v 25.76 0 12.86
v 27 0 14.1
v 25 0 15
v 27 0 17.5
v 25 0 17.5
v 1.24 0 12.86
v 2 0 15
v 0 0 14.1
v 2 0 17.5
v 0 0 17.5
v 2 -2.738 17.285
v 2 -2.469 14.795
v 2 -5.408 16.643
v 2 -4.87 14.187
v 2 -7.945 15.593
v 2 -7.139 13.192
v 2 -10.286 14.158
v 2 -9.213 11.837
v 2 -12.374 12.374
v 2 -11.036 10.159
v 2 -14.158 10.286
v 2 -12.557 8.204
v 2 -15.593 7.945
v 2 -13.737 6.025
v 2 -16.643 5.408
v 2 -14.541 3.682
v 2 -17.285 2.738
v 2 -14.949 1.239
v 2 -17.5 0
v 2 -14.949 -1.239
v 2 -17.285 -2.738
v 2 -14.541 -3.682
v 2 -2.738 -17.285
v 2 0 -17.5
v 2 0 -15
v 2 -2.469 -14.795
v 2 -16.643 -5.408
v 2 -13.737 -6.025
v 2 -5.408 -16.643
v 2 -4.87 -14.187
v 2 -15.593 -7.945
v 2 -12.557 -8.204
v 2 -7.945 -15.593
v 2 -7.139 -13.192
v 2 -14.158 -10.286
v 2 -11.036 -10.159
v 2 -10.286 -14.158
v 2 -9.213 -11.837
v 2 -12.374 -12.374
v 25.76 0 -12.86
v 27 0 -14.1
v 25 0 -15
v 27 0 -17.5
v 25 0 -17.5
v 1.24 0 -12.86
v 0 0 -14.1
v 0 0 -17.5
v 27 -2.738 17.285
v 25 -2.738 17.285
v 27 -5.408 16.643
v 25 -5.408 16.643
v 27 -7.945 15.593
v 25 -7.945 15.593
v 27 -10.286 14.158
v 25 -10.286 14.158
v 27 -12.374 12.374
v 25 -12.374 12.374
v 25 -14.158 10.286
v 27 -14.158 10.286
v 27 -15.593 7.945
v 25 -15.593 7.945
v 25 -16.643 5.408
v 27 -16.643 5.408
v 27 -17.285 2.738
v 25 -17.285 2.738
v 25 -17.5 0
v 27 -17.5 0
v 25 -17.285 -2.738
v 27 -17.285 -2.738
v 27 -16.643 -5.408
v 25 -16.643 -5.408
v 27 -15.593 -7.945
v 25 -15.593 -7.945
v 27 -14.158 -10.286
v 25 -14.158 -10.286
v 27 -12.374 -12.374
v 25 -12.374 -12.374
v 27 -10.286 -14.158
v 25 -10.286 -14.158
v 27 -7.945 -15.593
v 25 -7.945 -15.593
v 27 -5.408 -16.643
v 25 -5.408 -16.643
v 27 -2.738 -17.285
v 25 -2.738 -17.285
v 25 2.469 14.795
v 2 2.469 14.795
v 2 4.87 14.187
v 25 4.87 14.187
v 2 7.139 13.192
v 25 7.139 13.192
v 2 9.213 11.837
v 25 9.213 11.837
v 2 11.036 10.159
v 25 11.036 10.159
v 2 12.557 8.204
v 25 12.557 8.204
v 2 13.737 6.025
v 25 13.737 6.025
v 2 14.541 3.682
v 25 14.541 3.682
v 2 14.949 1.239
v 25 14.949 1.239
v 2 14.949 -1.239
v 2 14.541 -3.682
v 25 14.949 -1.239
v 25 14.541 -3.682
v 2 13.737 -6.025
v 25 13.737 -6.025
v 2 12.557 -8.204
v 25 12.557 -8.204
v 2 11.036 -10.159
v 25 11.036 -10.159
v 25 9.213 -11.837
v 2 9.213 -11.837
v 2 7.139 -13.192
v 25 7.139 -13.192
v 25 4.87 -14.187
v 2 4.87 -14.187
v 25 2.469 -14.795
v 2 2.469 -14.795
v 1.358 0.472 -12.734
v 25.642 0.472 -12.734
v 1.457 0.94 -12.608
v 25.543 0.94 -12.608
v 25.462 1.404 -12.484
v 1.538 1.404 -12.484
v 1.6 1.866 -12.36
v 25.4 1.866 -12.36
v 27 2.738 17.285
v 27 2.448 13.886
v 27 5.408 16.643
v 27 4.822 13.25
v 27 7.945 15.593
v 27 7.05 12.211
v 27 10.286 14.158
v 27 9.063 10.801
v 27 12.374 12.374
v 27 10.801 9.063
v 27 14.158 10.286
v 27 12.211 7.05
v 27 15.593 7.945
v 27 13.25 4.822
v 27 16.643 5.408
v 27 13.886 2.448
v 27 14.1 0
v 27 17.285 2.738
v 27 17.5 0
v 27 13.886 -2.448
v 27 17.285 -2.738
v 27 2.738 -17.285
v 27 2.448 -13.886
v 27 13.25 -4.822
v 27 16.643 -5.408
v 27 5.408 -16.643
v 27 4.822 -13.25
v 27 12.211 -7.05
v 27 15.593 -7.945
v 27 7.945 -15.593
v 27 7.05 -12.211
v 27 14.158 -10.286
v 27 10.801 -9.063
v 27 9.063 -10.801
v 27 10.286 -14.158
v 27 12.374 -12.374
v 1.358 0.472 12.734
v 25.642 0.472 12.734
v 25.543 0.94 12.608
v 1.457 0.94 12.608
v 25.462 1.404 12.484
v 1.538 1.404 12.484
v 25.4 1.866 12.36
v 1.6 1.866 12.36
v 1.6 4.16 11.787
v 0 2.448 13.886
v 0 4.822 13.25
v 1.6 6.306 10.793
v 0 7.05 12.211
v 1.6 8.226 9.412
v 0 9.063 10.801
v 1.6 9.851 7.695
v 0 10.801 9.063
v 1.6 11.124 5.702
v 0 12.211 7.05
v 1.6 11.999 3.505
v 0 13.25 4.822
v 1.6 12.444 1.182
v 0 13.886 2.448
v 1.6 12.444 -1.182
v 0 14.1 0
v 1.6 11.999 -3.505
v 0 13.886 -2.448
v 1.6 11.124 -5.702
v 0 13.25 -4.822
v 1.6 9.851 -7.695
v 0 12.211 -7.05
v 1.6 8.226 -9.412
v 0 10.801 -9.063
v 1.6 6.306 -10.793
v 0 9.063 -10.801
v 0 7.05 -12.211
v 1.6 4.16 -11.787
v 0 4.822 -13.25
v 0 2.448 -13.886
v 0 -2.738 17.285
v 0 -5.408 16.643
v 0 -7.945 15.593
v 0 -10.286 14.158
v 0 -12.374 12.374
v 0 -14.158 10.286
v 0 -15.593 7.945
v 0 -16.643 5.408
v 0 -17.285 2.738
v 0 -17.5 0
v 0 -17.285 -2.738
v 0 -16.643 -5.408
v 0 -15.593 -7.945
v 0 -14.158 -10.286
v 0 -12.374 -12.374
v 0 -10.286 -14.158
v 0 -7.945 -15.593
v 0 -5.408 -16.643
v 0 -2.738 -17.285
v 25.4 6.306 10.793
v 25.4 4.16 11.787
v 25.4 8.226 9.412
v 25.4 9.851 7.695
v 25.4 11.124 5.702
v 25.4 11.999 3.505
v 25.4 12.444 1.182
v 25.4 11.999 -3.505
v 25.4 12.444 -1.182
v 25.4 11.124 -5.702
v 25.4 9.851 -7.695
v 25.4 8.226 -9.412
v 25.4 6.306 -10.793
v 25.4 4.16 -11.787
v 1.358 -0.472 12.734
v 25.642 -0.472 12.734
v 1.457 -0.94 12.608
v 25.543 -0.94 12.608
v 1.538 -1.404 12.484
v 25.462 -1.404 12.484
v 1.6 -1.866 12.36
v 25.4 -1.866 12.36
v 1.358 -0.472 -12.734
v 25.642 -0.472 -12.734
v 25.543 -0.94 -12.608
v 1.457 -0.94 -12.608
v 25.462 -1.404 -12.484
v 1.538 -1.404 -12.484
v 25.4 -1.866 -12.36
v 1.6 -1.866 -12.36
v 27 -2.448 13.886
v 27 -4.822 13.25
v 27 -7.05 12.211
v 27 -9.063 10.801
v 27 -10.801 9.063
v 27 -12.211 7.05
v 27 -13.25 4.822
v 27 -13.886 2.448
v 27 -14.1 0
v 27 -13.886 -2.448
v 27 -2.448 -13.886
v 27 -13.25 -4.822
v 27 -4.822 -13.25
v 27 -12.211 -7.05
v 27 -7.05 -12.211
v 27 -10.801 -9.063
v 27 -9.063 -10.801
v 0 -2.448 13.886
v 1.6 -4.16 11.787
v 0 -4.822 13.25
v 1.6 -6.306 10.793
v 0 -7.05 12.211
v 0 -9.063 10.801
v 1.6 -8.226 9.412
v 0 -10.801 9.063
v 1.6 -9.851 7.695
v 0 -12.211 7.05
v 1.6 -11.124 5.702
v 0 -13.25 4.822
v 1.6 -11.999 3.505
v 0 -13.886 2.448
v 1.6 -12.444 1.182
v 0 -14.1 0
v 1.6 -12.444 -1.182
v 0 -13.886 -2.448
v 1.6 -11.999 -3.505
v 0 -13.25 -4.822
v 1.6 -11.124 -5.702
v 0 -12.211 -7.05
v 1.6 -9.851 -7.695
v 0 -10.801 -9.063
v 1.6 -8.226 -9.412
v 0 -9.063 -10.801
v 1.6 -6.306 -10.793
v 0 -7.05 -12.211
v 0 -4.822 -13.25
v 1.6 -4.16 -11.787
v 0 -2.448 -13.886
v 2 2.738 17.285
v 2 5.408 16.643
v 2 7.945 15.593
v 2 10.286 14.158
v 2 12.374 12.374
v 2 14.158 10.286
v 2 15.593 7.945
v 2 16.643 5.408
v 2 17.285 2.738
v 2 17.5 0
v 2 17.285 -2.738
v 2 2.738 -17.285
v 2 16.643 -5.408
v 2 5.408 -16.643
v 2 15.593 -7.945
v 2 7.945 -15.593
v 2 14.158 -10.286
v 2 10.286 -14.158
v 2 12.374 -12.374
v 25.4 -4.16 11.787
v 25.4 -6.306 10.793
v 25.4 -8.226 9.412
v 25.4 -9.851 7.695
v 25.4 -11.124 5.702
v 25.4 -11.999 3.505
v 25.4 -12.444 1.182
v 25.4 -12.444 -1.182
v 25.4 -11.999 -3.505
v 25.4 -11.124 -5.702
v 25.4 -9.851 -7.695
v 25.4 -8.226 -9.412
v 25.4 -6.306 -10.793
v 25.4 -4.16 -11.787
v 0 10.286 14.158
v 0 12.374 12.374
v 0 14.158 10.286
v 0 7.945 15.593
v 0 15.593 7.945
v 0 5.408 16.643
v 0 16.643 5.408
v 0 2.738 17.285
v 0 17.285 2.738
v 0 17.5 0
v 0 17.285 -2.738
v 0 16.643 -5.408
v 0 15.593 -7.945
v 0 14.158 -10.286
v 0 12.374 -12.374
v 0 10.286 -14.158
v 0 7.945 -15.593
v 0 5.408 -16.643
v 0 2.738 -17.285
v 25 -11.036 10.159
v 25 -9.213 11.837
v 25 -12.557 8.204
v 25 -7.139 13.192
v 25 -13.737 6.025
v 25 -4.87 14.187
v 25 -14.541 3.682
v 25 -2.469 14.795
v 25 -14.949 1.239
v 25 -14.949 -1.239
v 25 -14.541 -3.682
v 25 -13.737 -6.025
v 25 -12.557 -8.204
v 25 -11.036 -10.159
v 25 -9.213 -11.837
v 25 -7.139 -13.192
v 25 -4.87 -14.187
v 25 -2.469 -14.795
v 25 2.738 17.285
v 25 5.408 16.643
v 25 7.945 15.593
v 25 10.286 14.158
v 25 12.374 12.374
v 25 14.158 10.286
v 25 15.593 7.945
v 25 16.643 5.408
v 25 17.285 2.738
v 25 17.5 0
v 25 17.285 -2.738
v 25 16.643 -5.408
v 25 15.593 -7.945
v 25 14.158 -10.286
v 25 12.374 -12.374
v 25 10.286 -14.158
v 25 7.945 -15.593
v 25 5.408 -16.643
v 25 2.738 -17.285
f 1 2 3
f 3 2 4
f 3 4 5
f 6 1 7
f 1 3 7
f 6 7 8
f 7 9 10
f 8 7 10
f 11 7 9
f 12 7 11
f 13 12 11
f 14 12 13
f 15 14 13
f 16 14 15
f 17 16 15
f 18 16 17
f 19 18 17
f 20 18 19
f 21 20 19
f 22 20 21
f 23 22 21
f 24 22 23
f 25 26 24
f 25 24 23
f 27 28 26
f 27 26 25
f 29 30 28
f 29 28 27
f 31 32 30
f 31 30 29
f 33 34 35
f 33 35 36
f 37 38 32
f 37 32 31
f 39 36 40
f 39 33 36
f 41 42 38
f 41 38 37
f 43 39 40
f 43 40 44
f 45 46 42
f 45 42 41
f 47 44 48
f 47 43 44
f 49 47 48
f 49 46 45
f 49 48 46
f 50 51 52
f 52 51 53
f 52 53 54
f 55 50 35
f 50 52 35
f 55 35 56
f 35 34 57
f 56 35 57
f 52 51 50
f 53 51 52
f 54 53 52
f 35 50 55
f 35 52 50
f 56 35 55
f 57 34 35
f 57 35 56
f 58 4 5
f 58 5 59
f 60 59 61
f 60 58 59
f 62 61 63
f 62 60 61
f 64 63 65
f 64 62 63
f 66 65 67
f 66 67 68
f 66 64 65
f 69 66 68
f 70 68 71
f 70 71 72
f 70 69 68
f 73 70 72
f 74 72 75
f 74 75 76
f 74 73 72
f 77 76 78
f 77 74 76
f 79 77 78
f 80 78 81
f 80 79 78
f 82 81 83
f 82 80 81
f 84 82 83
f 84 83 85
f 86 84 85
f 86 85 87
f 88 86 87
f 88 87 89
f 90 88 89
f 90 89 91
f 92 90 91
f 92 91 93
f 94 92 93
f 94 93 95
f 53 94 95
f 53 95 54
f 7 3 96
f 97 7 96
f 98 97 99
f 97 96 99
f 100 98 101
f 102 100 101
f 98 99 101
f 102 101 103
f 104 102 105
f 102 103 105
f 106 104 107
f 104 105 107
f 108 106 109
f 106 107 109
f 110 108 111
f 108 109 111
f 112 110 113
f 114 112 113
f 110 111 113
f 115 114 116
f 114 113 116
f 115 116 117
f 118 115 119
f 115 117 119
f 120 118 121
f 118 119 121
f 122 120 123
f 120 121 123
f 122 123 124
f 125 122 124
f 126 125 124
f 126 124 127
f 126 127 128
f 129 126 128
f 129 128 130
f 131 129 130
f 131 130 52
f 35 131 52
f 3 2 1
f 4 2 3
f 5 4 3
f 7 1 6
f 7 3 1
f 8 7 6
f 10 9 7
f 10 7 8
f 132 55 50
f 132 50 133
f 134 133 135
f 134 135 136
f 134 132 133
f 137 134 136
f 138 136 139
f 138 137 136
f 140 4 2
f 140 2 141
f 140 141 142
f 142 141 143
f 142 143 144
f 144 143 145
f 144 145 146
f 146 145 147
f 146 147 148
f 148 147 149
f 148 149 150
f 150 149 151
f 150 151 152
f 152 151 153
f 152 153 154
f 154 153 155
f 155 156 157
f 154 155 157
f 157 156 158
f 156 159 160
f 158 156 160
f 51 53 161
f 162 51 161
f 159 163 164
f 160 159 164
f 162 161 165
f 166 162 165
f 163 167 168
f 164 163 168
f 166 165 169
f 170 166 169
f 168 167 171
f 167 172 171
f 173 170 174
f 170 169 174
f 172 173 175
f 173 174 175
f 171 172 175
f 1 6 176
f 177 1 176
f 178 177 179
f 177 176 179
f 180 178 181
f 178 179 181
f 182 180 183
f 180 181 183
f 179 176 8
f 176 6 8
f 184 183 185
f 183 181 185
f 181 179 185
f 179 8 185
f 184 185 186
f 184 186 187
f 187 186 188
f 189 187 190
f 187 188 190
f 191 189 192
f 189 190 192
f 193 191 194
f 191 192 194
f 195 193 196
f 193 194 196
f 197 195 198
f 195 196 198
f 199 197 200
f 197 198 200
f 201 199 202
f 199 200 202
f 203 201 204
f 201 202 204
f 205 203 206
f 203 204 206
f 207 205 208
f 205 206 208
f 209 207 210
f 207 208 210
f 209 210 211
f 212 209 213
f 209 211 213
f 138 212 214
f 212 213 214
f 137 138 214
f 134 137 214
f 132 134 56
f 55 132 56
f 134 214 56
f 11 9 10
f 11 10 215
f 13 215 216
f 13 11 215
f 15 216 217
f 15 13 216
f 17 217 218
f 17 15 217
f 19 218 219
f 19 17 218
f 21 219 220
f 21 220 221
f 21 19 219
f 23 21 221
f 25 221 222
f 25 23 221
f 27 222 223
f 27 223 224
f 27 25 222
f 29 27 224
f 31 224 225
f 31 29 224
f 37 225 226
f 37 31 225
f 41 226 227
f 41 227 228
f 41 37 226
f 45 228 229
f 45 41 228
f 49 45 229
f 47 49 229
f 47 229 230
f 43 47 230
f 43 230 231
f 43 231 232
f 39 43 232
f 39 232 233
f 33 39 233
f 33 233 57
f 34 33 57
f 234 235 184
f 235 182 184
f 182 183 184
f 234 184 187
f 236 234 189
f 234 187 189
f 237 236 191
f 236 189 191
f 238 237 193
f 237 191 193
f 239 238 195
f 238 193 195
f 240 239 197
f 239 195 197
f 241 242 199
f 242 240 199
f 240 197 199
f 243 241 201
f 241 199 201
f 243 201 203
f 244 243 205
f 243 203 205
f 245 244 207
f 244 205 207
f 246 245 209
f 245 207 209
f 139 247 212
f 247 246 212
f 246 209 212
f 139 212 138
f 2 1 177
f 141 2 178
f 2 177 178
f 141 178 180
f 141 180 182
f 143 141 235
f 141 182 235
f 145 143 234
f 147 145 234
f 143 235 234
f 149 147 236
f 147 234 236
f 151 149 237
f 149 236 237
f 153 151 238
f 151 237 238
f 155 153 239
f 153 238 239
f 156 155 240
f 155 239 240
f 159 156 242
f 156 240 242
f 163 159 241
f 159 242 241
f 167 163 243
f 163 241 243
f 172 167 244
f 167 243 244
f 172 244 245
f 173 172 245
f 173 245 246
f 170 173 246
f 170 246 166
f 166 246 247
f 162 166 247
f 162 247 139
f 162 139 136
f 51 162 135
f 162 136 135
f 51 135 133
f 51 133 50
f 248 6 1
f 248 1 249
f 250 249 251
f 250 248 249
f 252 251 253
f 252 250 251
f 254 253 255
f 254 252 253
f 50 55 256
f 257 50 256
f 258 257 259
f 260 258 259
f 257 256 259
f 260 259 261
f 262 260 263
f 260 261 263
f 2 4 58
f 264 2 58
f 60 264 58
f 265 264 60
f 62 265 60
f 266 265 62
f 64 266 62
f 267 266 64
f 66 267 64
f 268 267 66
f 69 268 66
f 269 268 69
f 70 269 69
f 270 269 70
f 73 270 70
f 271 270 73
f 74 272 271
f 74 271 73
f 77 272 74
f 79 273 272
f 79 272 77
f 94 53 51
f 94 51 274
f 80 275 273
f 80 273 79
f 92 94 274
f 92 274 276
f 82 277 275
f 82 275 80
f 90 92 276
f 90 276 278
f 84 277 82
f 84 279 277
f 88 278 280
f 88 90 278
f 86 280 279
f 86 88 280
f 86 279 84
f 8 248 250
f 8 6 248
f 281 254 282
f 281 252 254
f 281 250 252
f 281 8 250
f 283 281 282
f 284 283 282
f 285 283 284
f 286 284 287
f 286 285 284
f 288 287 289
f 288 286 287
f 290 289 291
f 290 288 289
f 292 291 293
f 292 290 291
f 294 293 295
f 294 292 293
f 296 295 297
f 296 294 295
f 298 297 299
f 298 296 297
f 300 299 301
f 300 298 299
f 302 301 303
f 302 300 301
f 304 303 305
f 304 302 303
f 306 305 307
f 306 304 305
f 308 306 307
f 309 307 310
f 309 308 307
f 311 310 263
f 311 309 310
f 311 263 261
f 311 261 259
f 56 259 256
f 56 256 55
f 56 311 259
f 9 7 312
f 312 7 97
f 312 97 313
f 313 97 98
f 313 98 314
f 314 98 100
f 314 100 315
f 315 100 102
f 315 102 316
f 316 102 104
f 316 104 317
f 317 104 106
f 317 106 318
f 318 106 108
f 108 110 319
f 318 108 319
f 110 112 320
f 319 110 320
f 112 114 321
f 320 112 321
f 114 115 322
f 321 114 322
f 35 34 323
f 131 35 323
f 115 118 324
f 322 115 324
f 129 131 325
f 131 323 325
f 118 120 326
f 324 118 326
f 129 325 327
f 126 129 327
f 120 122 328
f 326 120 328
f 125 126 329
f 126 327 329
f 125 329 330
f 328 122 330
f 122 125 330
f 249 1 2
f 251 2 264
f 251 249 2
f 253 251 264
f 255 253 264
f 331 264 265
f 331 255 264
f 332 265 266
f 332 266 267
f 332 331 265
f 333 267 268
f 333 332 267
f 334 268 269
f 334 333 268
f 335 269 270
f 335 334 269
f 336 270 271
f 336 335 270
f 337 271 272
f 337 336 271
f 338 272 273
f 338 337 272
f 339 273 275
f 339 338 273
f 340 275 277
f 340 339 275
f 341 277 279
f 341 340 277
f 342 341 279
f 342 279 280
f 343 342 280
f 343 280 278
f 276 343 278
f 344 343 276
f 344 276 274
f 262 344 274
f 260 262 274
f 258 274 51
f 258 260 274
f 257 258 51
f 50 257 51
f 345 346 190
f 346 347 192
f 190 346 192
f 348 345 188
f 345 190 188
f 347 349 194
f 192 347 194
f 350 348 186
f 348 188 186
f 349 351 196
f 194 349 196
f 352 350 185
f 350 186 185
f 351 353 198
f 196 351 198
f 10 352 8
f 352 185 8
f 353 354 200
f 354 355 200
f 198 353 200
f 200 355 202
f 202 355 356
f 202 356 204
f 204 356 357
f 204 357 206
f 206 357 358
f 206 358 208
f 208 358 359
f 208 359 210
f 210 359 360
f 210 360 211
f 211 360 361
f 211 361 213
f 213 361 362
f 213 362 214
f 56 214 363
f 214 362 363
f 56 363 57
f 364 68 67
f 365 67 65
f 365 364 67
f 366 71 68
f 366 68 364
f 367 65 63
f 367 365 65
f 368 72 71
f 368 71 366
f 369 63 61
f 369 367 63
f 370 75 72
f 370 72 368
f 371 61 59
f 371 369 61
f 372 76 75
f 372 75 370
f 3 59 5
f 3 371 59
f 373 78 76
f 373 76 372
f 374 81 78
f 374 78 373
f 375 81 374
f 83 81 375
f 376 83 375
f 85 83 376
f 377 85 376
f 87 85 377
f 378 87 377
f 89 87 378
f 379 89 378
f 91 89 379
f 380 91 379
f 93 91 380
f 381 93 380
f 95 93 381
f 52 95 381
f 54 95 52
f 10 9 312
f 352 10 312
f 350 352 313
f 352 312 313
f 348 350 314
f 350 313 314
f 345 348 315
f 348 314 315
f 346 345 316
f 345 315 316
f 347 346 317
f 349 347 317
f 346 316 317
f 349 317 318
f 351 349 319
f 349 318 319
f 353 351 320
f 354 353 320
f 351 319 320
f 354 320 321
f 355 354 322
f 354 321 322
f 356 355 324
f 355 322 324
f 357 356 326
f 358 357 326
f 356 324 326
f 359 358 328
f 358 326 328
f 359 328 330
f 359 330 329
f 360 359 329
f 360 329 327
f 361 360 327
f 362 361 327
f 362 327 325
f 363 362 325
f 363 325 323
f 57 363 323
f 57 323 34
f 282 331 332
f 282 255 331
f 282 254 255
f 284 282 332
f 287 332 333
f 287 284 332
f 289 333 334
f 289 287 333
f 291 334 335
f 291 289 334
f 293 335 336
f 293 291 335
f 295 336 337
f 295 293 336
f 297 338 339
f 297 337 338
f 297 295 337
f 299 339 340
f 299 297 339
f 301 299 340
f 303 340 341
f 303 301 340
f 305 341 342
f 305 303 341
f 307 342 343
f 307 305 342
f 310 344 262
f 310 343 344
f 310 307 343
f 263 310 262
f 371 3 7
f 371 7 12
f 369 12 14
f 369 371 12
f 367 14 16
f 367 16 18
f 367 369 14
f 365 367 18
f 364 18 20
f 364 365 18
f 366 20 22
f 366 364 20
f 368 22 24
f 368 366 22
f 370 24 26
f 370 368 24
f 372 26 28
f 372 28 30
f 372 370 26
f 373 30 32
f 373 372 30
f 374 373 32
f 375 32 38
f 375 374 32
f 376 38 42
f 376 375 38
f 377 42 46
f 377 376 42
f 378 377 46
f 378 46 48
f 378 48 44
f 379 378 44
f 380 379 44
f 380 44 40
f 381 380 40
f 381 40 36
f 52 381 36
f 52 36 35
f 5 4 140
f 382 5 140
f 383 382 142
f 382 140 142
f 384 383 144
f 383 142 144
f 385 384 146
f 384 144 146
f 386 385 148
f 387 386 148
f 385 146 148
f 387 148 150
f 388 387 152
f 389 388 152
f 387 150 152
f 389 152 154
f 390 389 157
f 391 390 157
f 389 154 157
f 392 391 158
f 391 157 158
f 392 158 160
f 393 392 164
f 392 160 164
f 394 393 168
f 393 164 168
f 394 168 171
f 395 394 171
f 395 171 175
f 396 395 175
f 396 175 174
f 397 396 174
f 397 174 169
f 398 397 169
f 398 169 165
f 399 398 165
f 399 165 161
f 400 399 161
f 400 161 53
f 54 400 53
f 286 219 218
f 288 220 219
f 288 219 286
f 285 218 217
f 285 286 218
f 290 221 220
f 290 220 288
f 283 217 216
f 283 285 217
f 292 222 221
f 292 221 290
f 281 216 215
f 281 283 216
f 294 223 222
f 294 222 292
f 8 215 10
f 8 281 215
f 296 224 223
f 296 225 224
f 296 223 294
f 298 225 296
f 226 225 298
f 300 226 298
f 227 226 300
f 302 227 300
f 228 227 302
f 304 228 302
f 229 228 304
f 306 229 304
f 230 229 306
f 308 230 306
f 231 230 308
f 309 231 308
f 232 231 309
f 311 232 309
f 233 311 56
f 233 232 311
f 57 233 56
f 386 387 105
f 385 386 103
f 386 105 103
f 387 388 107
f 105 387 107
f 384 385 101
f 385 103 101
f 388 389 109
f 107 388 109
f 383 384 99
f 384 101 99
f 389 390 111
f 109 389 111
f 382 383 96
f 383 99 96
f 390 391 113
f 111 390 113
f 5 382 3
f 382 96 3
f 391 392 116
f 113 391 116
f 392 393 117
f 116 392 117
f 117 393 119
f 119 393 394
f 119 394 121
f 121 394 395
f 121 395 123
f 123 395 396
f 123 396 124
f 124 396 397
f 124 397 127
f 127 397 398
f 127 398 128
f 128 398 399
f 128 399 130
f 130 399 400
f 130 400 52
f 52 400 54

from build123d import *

# Parameters (mm, degrees)
REVOLVE_1_ANGLE     = 180
CUT_EXTRUDE_1_DEPTH = 37.626493144


with BuildPart() as part:
    # Эскиз1 → Повернуть1 (revolve, symmetric)
    with BuildSketch(Plane.XY) as revolve_1_sk:
        Polygon((0, 14.1), (0, 17.5), (2, 17.5), (2, 15), (25, 15), (25, 17.5), (27, 17.5), (27, 14.1), (25.4, 12.5), (1.6, 12.5), align=None)
    revolve(axis=Axis((-27.195971024, 0, 0), (1, 0, 0)), revolution_arc=REVOLVE_1_ANGLE / 2)
    revolve(revolve_1_sk.sketch, axis=Axis((-27.195971024, 0, 0), (-1, 0, 0)), revolution_arc=REVOLVE_1_ANGLE / 2)

    # Эскиз2 → Вырез-Вытянуть1 (cut, through all)
    with BuildSketch(Plane.ZY):
        Polygon((12.85993322, 0), (12.35993322, 1.866025404), (12.35993322, 0), align=None)
        Polygon((-12.85993322, 0), (-12.35993322, 1.866025404), (-12.35993322, 0), align=None)
    extrude(amount=-CUT_EXTRUDE_1_DEPTH, mode=Mode.SUBTRACT)


with BuildPart() as body_2:
    # Зеркальное отражение1: mirrored copy
    add(part.part.mirror(Plane.ZX))


solid = Compound([part.part, body_2.part])
